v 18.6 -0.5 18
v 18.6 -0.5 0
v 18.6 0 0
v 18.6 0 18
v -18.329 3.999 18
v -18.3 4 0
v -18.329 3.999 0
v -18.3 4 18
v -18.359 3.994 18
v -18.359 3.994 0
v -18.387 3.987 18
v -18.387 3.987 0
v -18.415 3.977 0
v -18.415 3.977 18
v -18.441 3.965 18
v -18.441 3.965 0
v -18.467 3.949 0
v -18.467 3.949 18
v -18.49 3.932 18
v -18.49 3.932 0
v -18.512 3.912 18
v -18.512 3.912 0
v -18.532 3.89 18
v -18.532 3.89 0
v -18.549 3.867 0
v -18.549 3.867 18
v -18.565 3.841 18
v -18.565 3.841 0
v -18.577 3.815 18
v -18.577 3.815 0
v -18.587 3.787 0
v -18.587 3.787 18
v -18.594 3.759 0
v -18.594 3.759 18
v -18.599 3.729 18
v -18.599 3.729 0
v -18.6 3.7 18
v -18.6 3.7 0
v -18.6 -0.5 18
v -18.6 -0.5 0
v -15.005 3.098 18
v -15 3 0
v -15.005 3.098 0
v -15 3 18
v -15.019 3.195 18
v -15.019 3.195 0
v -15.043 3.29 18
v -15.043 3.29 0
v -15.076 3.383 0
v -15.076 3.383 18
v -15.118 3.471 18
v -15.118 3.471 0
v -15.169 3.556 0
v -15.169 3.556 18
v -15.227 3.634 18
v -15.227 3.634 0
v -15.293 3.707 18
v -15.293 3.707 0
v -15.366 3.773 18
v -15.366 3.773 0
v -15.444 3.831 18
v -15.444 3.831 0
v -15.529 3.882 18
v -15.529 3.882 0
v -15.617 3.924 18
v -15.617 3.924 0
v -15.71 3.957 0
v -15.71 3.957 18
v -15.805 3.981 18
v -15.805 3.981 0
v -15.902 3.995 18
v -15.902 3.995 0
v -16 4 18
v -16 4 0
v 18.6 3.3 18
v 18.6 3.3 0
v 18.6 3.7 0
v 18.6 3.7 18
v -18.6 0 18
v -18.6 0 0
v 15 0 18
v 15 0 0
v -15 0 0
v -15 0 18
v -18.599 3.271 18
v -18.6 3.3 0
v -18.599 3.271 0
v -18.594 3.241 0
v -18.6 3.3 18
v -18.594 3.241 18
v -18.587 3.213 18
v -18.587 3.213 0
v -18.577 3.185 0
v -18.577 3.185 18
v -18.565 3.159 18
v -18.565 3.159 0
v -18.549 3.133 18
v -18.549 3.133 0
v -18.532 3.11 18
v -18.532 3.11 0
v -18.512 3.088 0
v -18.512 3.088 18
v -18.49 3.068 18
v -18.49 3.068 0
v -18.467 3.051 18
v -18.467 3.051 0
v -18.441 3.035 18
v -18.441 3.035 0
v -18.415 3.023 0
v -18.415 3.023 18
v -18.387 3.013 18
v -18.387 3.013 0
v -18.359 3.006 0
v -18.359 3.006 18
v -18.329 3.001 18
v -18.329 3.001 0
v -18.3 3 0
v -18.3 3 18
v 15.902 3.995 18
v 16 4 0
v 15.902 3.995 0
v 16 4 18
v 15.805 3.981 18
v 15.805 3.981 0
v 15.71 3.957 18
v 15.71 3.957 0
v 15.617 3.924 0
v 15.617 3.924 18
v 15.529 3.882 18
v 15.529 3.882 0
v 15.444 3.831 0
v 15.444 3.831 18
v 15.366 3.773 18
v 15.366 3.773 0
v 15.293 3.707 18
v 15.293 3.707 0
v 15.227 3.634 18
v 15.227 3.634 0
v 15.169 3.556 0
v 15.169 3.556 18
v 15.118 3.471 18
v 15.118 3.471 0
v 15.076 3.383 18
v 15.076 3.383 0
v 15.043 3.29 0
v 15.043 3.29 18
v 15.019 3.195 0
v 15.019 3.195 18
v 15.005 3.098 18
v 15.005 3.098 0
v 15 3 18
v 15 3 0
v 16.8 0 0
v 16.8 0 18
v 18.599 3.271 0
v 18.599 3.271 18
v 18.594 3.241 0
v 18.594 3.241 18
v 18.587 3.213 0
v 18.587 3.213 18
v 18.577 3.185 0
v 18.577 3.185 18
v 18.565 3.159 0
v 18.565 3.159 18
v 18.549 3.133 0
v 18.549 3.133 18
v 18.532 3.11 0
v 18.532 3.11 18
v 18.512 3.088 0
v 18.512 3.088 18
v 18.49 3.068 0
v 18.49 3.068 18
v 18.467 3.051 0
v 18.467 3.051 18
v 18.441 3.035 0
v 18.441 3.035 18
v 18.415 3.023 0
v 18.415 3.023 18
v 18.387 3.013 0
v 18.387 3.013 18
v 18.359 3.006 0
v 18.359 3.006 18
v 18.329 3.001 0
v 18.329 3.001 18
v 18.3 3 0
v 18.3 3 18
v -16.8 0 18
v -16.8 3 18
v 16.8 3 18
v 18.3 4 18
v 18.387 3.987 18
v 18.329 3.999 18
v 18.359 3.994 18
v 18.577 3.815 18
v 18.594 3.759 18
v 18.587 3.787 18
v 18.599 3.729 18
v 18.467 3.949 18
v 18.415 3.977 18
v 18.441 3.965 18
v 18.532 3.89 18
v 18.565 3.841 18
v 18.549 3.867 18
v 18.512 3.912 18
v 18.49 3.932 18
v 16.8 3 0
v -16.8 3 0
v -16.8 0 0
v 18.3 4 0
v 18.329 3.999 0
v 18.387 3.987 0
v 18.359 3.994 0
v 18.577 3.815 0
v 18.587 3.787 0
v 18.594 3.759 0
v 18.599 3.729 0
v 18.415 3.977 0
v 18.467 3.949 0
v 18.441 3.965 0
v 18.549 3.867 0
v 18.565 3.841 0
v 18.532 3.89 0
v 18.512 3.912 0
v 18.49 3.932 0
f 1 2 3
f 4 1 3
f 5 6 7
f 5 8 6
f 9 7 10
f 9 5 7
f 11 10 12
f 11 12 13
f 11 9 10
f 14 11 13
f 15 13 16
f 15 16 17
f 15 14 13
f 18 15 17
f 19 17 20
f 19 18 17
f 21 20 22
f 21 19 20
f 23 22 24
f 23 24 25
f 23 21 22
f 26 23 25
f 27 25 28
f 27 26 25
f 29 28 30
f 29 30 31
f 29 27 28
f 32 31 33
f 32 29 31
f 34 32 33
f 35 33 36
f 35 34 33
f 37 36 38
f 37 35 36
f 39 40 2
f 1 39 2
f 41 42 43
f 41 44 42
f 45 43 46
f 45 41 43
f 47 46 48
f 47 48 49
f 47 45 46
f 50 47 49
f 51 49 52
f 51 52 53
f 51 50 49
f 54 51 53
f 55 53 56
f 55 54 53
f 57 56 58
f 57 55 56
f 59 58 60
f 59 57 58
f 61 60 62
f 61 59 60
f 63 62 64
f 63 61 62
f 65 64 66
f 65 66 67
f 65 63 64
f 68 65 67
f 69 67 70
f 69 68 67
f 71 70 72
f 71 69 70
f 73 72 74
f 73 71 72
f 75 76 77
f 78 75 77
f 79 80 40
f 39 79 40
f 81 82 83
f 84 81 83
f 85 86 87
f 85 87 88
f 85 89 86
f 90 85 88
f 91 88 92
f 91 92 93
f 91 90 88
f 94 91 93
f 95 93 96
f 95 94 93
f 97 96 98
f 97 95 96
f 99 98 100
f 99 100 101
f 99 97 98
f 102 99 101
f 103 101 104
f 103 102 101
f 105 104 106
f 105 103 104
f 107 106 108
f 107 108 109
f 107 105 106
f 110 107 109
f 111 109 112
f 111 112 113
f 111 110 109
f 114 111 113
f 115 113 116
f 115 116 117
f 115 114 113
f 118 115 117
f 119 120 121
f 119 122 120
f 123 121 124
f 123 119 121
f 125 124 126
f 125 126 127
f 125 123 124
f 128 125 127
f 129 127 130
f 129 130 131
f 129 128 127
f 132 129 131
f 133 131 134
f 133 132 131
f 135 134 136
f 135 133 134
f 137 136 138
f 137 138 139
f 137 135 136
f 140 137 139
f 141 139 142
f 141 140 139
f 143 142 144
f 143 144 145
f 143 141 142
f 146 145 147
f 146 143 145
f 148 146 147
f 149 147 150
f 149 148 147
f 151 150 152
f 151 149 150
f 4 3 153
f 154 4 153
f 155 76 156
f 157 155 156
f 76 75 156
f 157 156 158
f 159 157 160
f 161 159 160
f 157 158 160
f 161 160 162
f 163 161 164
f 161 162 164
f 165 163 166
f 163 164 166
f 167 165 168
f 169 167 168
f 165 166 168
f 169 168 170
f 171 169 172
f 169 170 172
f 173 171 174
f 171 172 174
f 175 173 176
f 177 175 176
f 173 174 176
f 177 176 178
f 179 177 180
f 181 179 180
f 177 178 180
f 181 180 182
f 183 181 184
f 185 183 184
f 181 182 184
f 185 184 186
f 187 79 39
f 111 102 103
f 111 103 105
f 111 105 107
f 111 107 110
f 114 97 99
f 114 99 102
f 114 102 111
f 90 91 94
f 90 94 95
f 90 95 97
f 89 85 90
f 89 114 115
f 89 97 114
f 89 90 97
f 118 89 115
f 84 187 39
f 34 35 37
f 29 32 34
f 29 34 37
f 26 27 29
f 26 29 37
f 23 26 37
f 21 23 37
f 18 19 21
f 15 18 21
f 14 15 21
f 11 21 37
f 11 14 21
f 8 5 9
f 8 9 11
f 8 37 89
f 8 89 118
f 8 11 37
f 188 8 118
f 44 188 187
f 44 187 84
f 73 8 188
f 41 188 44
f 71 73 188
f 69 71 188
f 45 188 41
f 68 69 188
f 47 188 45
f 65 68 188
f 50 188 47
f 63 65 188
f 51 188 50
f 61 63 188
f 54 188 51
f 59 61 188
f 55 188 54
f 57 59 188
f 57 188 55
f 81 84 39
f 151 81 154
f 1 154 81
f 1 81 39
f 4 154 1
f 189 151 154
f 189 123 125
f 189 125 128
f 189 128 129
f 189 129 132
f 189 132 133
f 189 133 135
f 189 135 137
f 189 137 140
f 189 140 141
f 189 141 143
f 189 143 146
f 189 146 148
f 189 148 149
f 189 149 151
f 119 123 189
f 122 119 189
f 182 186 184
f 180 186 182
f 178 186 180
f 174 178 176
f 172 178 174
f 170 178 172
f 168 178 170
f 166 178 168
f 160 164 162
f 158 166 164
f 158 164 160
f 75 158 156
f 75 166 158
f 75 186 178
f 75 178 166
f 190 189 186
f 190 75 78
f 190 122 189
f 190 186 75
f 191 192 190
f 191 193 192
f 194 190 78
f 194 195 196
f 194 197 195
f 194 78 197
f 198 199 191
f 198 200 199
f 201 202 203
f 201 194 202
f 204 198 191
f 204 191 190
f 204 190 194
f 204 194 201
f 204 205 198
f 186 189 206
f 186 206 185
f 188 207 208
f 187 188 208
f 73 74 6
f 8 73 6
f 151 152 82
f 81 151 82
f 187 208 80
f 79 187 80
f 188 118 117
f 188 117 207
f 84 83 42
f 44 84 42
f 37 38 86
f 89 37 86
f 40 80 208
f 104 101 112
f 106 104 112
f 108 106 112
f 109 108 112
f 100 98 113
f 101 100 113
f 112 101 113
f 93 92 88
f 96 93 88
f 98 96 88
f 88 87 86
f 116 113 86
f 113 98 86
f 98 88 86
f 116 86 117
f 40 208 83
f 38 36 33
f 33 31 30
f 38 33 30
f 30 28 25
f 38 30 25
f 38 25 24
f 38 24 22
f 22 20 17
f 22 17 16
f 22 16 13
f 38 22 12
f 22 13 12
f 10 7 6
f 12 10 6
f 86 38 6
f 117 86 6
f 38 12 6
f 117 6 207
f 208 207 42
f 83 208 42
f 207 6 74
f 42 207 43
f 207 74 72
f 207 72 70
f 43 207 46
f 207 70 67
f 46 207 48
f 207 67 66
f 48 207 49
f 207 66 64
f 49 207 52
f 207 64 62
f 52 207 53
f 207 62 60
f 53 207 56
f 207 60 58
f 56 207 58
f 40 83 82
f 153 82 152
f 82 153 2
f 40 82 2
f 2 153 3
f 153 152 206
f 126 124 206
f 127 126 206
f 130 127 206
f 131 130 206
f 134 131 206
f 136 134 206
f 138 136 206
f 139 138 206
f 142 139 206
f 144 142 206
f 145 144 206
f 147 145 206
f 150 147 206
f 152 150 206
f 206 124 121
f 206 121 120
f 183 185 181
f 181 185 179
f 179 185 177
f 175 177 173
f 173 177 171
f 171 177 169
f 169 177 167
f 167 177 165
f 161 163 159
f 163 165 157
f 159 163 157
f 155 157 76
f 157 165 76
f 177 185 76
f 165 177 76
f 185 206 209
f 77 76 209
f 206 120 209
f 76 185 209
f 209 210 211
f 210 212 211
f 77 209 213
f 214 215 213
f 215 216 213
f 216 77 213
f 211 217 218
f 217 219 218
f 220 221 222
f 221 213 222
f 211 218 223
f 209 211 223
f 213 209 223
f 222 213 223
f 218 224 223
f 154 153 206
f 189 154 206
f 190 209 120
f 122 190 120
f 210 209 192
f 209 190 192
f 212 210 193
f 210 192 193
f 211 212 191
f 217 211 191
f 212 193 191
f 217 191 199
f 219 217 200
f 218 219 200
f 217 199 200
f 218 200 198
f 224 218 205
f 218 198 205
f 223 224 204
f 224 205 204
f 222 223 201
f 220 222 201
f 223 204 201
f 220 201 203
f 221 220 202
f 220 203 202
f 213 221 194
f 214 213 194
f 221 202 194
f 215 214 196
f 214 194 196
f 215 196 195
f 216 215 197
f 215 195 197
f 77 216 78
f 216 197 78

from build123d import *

# Parameters (mm, degrees)
BOSS_EXTRUDE1_DEPTH = 18
FILLET1_R           = 1
FILLET2_R           = 0.3


with BuildPart() as part:
    # Sketch1 → Boss-Extrude1 (new body)
    with BuildSketch(Plane.XY):
        Polygon((-15, 0), (-15, 4), (-18.6, 4), (-18.6, 3), (-16.8, 3), (-16.8, 0), (-18.6, 0), (-18.6, -0.5), (18.6, -0.5), (18.6, 0), (16.8, 0), (16.8, 3), (18.6, 3), (18.6, 4), (15, 4), (15, 0), align=None)
    extrude(amount=BOSS_EXTRUDE1_DEPTH)

    # Fillet1
    fillet1_edges = [part.edges().sort_by_distance(p)[0] for p in [
        (-15, 4, 9),
        (15, 4, 9),
    ]]
    fillet(fillet1_edges, radius=FILLET1_R)

    # Fillet2
    fillet2_edges = [part.edges().sort_by_distance(p)[0] for p in [
        (-18.6, 3, 9),
        (-18.6, 4, 9),
        (18.6, 4, 9),
        (18.6, 3, 9),
    ]]
    fillet(fillet2_edges, radius=FILLET2_R)


solid = part.part
